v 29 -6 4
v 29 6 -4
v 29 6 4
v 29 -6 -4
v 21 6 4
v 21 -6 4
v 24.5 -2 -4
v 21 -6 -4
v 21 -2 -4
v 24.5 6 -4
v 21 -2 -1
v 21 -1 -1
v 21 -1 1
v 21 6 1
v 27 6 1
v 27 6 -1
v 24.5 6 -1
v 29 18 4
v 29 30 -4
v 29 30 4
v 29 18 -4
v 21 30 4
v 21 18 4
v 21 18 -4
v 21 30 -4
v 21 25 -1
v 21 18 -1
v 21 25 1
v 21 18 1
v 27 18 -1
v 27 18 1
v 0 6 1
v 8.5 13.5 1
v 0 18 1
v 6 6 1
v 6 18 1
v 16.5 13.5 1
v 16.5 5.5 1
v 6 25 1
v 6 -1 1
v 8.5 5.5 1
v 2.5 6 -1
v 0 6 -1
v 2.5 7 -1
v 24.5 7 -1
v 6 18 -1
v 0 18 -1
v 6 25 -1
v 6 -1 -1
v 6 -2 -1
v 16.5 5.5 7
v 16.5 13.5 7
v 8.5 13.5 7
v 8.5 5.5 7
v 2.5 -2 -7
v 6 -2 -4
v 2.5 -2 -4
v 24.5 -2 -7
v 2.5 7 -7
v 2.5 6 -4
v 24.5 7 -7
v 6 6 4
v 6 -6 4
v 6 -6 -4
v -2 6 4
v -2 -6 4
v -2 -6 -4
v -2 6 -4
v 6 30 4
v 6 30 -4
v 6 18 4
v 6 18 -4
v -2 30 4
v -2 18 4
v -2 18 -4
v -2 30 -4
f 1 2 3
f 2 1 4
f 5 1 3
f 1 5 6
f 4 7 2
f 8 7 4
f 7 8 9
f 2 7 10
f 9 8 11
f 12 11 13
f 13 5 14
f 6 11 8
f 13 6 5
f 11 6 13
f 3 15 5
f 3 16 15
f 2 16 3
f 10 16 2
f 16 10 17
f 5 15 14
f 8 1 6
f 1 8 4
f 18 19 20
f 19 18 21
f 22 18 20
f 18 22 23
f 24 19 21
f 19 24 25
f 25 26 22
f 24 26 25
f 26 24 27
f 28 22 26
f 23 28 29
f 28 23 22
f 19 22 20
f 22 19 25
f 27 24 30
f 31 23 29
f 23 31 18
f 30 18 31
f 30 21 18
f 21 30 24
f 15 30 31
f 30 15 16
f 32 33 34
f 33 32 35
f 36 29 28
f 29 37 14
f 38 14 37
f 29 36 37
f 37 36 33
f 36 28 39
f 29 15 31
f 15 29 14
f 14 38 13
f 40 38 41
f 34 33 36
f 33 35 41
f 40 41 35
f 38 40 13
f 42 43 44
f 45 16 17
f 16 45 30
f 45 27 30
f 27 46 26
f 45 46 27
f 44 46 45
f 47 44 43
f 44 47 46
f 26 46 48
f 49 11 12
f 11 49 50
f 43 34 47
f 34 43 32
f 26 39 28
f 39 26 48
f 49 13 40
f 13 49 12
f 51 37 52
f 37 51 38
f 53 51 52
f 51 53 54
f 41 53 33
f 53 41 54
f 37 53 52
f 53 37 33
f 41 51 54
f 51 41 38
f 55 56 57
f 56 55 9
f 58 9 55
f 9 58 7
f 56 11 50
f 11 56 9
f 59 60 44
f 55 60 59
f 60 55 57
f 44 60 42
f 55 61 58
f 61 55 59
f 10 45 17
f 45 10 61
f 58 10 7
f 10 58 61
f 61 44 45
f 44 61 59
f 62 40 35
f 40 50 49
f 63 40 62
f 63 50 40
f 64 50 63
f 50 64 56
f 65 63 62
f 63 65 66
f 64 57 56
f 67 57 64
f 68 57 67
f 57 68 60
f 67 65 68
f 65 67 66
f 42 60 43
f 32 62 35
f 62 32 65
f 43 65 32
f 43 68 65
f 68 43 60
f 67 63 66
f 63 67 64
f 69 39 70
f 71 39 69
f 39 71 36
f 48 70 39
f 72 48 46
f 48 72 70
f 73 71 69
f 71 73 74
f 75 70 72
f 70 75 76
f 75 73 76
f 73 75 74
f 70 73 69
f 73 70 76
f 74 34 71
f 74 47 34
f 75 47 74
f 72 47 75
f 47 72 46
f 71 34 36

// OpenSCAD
boxThickness =2;

module drawCamera(){
	translate([0,-1,-1])cube([27, 26,2]);
	color("black") translate([8.5,5.5,1]) cube([8,8,6]);
	translate([21+3+0.5,-2, -1-6]) rotate([0, 0, 90]) color("brown") cube([9, 22, 6]);
}

module drawOneCameraSupport(){
	translate([0,-3*boxThickness,-2*boxThickness]) cube([8, 6*boxThickness, 4*boxThickness]);
	}

module drawTopCameraSupport(){
	difference(){
		color("red") union(){
			translate([25-2*boxThickness, 0,0]) drawOneCameraSupport();
			translate([25-2*boxThickness, 24,0]) drawOneCameraSupport();
		}
		drawCamera();
	}
}

module drawBottomCameraSupport(){
	difference(){
		color("red") union(){
			translate([-boxThickness,0,0]) drawOneCameraSupport();
			translate([-boxThickness,24,0]) drawOneCameraSupport();
		}
		drawCamera();
	}
}

module drawCameraSupport(){
	difference(){
		color("red") union(){
			//translate([-boxThickness,0,0]) drawOneCameraSupport();
			translate([25-2*boxThickness, 0,0]) drawOneCameraSupport();
			//translate([-boxThickness,24,0]) drawOneCameraSupport();
			translate([25-2*boxThickness, 24,0]) drawOneCameraSupport();
		}
		drawCamera();
	}
}

drawTopCameraSupport();
drawBottomCameraSupport();
drawCamera();
